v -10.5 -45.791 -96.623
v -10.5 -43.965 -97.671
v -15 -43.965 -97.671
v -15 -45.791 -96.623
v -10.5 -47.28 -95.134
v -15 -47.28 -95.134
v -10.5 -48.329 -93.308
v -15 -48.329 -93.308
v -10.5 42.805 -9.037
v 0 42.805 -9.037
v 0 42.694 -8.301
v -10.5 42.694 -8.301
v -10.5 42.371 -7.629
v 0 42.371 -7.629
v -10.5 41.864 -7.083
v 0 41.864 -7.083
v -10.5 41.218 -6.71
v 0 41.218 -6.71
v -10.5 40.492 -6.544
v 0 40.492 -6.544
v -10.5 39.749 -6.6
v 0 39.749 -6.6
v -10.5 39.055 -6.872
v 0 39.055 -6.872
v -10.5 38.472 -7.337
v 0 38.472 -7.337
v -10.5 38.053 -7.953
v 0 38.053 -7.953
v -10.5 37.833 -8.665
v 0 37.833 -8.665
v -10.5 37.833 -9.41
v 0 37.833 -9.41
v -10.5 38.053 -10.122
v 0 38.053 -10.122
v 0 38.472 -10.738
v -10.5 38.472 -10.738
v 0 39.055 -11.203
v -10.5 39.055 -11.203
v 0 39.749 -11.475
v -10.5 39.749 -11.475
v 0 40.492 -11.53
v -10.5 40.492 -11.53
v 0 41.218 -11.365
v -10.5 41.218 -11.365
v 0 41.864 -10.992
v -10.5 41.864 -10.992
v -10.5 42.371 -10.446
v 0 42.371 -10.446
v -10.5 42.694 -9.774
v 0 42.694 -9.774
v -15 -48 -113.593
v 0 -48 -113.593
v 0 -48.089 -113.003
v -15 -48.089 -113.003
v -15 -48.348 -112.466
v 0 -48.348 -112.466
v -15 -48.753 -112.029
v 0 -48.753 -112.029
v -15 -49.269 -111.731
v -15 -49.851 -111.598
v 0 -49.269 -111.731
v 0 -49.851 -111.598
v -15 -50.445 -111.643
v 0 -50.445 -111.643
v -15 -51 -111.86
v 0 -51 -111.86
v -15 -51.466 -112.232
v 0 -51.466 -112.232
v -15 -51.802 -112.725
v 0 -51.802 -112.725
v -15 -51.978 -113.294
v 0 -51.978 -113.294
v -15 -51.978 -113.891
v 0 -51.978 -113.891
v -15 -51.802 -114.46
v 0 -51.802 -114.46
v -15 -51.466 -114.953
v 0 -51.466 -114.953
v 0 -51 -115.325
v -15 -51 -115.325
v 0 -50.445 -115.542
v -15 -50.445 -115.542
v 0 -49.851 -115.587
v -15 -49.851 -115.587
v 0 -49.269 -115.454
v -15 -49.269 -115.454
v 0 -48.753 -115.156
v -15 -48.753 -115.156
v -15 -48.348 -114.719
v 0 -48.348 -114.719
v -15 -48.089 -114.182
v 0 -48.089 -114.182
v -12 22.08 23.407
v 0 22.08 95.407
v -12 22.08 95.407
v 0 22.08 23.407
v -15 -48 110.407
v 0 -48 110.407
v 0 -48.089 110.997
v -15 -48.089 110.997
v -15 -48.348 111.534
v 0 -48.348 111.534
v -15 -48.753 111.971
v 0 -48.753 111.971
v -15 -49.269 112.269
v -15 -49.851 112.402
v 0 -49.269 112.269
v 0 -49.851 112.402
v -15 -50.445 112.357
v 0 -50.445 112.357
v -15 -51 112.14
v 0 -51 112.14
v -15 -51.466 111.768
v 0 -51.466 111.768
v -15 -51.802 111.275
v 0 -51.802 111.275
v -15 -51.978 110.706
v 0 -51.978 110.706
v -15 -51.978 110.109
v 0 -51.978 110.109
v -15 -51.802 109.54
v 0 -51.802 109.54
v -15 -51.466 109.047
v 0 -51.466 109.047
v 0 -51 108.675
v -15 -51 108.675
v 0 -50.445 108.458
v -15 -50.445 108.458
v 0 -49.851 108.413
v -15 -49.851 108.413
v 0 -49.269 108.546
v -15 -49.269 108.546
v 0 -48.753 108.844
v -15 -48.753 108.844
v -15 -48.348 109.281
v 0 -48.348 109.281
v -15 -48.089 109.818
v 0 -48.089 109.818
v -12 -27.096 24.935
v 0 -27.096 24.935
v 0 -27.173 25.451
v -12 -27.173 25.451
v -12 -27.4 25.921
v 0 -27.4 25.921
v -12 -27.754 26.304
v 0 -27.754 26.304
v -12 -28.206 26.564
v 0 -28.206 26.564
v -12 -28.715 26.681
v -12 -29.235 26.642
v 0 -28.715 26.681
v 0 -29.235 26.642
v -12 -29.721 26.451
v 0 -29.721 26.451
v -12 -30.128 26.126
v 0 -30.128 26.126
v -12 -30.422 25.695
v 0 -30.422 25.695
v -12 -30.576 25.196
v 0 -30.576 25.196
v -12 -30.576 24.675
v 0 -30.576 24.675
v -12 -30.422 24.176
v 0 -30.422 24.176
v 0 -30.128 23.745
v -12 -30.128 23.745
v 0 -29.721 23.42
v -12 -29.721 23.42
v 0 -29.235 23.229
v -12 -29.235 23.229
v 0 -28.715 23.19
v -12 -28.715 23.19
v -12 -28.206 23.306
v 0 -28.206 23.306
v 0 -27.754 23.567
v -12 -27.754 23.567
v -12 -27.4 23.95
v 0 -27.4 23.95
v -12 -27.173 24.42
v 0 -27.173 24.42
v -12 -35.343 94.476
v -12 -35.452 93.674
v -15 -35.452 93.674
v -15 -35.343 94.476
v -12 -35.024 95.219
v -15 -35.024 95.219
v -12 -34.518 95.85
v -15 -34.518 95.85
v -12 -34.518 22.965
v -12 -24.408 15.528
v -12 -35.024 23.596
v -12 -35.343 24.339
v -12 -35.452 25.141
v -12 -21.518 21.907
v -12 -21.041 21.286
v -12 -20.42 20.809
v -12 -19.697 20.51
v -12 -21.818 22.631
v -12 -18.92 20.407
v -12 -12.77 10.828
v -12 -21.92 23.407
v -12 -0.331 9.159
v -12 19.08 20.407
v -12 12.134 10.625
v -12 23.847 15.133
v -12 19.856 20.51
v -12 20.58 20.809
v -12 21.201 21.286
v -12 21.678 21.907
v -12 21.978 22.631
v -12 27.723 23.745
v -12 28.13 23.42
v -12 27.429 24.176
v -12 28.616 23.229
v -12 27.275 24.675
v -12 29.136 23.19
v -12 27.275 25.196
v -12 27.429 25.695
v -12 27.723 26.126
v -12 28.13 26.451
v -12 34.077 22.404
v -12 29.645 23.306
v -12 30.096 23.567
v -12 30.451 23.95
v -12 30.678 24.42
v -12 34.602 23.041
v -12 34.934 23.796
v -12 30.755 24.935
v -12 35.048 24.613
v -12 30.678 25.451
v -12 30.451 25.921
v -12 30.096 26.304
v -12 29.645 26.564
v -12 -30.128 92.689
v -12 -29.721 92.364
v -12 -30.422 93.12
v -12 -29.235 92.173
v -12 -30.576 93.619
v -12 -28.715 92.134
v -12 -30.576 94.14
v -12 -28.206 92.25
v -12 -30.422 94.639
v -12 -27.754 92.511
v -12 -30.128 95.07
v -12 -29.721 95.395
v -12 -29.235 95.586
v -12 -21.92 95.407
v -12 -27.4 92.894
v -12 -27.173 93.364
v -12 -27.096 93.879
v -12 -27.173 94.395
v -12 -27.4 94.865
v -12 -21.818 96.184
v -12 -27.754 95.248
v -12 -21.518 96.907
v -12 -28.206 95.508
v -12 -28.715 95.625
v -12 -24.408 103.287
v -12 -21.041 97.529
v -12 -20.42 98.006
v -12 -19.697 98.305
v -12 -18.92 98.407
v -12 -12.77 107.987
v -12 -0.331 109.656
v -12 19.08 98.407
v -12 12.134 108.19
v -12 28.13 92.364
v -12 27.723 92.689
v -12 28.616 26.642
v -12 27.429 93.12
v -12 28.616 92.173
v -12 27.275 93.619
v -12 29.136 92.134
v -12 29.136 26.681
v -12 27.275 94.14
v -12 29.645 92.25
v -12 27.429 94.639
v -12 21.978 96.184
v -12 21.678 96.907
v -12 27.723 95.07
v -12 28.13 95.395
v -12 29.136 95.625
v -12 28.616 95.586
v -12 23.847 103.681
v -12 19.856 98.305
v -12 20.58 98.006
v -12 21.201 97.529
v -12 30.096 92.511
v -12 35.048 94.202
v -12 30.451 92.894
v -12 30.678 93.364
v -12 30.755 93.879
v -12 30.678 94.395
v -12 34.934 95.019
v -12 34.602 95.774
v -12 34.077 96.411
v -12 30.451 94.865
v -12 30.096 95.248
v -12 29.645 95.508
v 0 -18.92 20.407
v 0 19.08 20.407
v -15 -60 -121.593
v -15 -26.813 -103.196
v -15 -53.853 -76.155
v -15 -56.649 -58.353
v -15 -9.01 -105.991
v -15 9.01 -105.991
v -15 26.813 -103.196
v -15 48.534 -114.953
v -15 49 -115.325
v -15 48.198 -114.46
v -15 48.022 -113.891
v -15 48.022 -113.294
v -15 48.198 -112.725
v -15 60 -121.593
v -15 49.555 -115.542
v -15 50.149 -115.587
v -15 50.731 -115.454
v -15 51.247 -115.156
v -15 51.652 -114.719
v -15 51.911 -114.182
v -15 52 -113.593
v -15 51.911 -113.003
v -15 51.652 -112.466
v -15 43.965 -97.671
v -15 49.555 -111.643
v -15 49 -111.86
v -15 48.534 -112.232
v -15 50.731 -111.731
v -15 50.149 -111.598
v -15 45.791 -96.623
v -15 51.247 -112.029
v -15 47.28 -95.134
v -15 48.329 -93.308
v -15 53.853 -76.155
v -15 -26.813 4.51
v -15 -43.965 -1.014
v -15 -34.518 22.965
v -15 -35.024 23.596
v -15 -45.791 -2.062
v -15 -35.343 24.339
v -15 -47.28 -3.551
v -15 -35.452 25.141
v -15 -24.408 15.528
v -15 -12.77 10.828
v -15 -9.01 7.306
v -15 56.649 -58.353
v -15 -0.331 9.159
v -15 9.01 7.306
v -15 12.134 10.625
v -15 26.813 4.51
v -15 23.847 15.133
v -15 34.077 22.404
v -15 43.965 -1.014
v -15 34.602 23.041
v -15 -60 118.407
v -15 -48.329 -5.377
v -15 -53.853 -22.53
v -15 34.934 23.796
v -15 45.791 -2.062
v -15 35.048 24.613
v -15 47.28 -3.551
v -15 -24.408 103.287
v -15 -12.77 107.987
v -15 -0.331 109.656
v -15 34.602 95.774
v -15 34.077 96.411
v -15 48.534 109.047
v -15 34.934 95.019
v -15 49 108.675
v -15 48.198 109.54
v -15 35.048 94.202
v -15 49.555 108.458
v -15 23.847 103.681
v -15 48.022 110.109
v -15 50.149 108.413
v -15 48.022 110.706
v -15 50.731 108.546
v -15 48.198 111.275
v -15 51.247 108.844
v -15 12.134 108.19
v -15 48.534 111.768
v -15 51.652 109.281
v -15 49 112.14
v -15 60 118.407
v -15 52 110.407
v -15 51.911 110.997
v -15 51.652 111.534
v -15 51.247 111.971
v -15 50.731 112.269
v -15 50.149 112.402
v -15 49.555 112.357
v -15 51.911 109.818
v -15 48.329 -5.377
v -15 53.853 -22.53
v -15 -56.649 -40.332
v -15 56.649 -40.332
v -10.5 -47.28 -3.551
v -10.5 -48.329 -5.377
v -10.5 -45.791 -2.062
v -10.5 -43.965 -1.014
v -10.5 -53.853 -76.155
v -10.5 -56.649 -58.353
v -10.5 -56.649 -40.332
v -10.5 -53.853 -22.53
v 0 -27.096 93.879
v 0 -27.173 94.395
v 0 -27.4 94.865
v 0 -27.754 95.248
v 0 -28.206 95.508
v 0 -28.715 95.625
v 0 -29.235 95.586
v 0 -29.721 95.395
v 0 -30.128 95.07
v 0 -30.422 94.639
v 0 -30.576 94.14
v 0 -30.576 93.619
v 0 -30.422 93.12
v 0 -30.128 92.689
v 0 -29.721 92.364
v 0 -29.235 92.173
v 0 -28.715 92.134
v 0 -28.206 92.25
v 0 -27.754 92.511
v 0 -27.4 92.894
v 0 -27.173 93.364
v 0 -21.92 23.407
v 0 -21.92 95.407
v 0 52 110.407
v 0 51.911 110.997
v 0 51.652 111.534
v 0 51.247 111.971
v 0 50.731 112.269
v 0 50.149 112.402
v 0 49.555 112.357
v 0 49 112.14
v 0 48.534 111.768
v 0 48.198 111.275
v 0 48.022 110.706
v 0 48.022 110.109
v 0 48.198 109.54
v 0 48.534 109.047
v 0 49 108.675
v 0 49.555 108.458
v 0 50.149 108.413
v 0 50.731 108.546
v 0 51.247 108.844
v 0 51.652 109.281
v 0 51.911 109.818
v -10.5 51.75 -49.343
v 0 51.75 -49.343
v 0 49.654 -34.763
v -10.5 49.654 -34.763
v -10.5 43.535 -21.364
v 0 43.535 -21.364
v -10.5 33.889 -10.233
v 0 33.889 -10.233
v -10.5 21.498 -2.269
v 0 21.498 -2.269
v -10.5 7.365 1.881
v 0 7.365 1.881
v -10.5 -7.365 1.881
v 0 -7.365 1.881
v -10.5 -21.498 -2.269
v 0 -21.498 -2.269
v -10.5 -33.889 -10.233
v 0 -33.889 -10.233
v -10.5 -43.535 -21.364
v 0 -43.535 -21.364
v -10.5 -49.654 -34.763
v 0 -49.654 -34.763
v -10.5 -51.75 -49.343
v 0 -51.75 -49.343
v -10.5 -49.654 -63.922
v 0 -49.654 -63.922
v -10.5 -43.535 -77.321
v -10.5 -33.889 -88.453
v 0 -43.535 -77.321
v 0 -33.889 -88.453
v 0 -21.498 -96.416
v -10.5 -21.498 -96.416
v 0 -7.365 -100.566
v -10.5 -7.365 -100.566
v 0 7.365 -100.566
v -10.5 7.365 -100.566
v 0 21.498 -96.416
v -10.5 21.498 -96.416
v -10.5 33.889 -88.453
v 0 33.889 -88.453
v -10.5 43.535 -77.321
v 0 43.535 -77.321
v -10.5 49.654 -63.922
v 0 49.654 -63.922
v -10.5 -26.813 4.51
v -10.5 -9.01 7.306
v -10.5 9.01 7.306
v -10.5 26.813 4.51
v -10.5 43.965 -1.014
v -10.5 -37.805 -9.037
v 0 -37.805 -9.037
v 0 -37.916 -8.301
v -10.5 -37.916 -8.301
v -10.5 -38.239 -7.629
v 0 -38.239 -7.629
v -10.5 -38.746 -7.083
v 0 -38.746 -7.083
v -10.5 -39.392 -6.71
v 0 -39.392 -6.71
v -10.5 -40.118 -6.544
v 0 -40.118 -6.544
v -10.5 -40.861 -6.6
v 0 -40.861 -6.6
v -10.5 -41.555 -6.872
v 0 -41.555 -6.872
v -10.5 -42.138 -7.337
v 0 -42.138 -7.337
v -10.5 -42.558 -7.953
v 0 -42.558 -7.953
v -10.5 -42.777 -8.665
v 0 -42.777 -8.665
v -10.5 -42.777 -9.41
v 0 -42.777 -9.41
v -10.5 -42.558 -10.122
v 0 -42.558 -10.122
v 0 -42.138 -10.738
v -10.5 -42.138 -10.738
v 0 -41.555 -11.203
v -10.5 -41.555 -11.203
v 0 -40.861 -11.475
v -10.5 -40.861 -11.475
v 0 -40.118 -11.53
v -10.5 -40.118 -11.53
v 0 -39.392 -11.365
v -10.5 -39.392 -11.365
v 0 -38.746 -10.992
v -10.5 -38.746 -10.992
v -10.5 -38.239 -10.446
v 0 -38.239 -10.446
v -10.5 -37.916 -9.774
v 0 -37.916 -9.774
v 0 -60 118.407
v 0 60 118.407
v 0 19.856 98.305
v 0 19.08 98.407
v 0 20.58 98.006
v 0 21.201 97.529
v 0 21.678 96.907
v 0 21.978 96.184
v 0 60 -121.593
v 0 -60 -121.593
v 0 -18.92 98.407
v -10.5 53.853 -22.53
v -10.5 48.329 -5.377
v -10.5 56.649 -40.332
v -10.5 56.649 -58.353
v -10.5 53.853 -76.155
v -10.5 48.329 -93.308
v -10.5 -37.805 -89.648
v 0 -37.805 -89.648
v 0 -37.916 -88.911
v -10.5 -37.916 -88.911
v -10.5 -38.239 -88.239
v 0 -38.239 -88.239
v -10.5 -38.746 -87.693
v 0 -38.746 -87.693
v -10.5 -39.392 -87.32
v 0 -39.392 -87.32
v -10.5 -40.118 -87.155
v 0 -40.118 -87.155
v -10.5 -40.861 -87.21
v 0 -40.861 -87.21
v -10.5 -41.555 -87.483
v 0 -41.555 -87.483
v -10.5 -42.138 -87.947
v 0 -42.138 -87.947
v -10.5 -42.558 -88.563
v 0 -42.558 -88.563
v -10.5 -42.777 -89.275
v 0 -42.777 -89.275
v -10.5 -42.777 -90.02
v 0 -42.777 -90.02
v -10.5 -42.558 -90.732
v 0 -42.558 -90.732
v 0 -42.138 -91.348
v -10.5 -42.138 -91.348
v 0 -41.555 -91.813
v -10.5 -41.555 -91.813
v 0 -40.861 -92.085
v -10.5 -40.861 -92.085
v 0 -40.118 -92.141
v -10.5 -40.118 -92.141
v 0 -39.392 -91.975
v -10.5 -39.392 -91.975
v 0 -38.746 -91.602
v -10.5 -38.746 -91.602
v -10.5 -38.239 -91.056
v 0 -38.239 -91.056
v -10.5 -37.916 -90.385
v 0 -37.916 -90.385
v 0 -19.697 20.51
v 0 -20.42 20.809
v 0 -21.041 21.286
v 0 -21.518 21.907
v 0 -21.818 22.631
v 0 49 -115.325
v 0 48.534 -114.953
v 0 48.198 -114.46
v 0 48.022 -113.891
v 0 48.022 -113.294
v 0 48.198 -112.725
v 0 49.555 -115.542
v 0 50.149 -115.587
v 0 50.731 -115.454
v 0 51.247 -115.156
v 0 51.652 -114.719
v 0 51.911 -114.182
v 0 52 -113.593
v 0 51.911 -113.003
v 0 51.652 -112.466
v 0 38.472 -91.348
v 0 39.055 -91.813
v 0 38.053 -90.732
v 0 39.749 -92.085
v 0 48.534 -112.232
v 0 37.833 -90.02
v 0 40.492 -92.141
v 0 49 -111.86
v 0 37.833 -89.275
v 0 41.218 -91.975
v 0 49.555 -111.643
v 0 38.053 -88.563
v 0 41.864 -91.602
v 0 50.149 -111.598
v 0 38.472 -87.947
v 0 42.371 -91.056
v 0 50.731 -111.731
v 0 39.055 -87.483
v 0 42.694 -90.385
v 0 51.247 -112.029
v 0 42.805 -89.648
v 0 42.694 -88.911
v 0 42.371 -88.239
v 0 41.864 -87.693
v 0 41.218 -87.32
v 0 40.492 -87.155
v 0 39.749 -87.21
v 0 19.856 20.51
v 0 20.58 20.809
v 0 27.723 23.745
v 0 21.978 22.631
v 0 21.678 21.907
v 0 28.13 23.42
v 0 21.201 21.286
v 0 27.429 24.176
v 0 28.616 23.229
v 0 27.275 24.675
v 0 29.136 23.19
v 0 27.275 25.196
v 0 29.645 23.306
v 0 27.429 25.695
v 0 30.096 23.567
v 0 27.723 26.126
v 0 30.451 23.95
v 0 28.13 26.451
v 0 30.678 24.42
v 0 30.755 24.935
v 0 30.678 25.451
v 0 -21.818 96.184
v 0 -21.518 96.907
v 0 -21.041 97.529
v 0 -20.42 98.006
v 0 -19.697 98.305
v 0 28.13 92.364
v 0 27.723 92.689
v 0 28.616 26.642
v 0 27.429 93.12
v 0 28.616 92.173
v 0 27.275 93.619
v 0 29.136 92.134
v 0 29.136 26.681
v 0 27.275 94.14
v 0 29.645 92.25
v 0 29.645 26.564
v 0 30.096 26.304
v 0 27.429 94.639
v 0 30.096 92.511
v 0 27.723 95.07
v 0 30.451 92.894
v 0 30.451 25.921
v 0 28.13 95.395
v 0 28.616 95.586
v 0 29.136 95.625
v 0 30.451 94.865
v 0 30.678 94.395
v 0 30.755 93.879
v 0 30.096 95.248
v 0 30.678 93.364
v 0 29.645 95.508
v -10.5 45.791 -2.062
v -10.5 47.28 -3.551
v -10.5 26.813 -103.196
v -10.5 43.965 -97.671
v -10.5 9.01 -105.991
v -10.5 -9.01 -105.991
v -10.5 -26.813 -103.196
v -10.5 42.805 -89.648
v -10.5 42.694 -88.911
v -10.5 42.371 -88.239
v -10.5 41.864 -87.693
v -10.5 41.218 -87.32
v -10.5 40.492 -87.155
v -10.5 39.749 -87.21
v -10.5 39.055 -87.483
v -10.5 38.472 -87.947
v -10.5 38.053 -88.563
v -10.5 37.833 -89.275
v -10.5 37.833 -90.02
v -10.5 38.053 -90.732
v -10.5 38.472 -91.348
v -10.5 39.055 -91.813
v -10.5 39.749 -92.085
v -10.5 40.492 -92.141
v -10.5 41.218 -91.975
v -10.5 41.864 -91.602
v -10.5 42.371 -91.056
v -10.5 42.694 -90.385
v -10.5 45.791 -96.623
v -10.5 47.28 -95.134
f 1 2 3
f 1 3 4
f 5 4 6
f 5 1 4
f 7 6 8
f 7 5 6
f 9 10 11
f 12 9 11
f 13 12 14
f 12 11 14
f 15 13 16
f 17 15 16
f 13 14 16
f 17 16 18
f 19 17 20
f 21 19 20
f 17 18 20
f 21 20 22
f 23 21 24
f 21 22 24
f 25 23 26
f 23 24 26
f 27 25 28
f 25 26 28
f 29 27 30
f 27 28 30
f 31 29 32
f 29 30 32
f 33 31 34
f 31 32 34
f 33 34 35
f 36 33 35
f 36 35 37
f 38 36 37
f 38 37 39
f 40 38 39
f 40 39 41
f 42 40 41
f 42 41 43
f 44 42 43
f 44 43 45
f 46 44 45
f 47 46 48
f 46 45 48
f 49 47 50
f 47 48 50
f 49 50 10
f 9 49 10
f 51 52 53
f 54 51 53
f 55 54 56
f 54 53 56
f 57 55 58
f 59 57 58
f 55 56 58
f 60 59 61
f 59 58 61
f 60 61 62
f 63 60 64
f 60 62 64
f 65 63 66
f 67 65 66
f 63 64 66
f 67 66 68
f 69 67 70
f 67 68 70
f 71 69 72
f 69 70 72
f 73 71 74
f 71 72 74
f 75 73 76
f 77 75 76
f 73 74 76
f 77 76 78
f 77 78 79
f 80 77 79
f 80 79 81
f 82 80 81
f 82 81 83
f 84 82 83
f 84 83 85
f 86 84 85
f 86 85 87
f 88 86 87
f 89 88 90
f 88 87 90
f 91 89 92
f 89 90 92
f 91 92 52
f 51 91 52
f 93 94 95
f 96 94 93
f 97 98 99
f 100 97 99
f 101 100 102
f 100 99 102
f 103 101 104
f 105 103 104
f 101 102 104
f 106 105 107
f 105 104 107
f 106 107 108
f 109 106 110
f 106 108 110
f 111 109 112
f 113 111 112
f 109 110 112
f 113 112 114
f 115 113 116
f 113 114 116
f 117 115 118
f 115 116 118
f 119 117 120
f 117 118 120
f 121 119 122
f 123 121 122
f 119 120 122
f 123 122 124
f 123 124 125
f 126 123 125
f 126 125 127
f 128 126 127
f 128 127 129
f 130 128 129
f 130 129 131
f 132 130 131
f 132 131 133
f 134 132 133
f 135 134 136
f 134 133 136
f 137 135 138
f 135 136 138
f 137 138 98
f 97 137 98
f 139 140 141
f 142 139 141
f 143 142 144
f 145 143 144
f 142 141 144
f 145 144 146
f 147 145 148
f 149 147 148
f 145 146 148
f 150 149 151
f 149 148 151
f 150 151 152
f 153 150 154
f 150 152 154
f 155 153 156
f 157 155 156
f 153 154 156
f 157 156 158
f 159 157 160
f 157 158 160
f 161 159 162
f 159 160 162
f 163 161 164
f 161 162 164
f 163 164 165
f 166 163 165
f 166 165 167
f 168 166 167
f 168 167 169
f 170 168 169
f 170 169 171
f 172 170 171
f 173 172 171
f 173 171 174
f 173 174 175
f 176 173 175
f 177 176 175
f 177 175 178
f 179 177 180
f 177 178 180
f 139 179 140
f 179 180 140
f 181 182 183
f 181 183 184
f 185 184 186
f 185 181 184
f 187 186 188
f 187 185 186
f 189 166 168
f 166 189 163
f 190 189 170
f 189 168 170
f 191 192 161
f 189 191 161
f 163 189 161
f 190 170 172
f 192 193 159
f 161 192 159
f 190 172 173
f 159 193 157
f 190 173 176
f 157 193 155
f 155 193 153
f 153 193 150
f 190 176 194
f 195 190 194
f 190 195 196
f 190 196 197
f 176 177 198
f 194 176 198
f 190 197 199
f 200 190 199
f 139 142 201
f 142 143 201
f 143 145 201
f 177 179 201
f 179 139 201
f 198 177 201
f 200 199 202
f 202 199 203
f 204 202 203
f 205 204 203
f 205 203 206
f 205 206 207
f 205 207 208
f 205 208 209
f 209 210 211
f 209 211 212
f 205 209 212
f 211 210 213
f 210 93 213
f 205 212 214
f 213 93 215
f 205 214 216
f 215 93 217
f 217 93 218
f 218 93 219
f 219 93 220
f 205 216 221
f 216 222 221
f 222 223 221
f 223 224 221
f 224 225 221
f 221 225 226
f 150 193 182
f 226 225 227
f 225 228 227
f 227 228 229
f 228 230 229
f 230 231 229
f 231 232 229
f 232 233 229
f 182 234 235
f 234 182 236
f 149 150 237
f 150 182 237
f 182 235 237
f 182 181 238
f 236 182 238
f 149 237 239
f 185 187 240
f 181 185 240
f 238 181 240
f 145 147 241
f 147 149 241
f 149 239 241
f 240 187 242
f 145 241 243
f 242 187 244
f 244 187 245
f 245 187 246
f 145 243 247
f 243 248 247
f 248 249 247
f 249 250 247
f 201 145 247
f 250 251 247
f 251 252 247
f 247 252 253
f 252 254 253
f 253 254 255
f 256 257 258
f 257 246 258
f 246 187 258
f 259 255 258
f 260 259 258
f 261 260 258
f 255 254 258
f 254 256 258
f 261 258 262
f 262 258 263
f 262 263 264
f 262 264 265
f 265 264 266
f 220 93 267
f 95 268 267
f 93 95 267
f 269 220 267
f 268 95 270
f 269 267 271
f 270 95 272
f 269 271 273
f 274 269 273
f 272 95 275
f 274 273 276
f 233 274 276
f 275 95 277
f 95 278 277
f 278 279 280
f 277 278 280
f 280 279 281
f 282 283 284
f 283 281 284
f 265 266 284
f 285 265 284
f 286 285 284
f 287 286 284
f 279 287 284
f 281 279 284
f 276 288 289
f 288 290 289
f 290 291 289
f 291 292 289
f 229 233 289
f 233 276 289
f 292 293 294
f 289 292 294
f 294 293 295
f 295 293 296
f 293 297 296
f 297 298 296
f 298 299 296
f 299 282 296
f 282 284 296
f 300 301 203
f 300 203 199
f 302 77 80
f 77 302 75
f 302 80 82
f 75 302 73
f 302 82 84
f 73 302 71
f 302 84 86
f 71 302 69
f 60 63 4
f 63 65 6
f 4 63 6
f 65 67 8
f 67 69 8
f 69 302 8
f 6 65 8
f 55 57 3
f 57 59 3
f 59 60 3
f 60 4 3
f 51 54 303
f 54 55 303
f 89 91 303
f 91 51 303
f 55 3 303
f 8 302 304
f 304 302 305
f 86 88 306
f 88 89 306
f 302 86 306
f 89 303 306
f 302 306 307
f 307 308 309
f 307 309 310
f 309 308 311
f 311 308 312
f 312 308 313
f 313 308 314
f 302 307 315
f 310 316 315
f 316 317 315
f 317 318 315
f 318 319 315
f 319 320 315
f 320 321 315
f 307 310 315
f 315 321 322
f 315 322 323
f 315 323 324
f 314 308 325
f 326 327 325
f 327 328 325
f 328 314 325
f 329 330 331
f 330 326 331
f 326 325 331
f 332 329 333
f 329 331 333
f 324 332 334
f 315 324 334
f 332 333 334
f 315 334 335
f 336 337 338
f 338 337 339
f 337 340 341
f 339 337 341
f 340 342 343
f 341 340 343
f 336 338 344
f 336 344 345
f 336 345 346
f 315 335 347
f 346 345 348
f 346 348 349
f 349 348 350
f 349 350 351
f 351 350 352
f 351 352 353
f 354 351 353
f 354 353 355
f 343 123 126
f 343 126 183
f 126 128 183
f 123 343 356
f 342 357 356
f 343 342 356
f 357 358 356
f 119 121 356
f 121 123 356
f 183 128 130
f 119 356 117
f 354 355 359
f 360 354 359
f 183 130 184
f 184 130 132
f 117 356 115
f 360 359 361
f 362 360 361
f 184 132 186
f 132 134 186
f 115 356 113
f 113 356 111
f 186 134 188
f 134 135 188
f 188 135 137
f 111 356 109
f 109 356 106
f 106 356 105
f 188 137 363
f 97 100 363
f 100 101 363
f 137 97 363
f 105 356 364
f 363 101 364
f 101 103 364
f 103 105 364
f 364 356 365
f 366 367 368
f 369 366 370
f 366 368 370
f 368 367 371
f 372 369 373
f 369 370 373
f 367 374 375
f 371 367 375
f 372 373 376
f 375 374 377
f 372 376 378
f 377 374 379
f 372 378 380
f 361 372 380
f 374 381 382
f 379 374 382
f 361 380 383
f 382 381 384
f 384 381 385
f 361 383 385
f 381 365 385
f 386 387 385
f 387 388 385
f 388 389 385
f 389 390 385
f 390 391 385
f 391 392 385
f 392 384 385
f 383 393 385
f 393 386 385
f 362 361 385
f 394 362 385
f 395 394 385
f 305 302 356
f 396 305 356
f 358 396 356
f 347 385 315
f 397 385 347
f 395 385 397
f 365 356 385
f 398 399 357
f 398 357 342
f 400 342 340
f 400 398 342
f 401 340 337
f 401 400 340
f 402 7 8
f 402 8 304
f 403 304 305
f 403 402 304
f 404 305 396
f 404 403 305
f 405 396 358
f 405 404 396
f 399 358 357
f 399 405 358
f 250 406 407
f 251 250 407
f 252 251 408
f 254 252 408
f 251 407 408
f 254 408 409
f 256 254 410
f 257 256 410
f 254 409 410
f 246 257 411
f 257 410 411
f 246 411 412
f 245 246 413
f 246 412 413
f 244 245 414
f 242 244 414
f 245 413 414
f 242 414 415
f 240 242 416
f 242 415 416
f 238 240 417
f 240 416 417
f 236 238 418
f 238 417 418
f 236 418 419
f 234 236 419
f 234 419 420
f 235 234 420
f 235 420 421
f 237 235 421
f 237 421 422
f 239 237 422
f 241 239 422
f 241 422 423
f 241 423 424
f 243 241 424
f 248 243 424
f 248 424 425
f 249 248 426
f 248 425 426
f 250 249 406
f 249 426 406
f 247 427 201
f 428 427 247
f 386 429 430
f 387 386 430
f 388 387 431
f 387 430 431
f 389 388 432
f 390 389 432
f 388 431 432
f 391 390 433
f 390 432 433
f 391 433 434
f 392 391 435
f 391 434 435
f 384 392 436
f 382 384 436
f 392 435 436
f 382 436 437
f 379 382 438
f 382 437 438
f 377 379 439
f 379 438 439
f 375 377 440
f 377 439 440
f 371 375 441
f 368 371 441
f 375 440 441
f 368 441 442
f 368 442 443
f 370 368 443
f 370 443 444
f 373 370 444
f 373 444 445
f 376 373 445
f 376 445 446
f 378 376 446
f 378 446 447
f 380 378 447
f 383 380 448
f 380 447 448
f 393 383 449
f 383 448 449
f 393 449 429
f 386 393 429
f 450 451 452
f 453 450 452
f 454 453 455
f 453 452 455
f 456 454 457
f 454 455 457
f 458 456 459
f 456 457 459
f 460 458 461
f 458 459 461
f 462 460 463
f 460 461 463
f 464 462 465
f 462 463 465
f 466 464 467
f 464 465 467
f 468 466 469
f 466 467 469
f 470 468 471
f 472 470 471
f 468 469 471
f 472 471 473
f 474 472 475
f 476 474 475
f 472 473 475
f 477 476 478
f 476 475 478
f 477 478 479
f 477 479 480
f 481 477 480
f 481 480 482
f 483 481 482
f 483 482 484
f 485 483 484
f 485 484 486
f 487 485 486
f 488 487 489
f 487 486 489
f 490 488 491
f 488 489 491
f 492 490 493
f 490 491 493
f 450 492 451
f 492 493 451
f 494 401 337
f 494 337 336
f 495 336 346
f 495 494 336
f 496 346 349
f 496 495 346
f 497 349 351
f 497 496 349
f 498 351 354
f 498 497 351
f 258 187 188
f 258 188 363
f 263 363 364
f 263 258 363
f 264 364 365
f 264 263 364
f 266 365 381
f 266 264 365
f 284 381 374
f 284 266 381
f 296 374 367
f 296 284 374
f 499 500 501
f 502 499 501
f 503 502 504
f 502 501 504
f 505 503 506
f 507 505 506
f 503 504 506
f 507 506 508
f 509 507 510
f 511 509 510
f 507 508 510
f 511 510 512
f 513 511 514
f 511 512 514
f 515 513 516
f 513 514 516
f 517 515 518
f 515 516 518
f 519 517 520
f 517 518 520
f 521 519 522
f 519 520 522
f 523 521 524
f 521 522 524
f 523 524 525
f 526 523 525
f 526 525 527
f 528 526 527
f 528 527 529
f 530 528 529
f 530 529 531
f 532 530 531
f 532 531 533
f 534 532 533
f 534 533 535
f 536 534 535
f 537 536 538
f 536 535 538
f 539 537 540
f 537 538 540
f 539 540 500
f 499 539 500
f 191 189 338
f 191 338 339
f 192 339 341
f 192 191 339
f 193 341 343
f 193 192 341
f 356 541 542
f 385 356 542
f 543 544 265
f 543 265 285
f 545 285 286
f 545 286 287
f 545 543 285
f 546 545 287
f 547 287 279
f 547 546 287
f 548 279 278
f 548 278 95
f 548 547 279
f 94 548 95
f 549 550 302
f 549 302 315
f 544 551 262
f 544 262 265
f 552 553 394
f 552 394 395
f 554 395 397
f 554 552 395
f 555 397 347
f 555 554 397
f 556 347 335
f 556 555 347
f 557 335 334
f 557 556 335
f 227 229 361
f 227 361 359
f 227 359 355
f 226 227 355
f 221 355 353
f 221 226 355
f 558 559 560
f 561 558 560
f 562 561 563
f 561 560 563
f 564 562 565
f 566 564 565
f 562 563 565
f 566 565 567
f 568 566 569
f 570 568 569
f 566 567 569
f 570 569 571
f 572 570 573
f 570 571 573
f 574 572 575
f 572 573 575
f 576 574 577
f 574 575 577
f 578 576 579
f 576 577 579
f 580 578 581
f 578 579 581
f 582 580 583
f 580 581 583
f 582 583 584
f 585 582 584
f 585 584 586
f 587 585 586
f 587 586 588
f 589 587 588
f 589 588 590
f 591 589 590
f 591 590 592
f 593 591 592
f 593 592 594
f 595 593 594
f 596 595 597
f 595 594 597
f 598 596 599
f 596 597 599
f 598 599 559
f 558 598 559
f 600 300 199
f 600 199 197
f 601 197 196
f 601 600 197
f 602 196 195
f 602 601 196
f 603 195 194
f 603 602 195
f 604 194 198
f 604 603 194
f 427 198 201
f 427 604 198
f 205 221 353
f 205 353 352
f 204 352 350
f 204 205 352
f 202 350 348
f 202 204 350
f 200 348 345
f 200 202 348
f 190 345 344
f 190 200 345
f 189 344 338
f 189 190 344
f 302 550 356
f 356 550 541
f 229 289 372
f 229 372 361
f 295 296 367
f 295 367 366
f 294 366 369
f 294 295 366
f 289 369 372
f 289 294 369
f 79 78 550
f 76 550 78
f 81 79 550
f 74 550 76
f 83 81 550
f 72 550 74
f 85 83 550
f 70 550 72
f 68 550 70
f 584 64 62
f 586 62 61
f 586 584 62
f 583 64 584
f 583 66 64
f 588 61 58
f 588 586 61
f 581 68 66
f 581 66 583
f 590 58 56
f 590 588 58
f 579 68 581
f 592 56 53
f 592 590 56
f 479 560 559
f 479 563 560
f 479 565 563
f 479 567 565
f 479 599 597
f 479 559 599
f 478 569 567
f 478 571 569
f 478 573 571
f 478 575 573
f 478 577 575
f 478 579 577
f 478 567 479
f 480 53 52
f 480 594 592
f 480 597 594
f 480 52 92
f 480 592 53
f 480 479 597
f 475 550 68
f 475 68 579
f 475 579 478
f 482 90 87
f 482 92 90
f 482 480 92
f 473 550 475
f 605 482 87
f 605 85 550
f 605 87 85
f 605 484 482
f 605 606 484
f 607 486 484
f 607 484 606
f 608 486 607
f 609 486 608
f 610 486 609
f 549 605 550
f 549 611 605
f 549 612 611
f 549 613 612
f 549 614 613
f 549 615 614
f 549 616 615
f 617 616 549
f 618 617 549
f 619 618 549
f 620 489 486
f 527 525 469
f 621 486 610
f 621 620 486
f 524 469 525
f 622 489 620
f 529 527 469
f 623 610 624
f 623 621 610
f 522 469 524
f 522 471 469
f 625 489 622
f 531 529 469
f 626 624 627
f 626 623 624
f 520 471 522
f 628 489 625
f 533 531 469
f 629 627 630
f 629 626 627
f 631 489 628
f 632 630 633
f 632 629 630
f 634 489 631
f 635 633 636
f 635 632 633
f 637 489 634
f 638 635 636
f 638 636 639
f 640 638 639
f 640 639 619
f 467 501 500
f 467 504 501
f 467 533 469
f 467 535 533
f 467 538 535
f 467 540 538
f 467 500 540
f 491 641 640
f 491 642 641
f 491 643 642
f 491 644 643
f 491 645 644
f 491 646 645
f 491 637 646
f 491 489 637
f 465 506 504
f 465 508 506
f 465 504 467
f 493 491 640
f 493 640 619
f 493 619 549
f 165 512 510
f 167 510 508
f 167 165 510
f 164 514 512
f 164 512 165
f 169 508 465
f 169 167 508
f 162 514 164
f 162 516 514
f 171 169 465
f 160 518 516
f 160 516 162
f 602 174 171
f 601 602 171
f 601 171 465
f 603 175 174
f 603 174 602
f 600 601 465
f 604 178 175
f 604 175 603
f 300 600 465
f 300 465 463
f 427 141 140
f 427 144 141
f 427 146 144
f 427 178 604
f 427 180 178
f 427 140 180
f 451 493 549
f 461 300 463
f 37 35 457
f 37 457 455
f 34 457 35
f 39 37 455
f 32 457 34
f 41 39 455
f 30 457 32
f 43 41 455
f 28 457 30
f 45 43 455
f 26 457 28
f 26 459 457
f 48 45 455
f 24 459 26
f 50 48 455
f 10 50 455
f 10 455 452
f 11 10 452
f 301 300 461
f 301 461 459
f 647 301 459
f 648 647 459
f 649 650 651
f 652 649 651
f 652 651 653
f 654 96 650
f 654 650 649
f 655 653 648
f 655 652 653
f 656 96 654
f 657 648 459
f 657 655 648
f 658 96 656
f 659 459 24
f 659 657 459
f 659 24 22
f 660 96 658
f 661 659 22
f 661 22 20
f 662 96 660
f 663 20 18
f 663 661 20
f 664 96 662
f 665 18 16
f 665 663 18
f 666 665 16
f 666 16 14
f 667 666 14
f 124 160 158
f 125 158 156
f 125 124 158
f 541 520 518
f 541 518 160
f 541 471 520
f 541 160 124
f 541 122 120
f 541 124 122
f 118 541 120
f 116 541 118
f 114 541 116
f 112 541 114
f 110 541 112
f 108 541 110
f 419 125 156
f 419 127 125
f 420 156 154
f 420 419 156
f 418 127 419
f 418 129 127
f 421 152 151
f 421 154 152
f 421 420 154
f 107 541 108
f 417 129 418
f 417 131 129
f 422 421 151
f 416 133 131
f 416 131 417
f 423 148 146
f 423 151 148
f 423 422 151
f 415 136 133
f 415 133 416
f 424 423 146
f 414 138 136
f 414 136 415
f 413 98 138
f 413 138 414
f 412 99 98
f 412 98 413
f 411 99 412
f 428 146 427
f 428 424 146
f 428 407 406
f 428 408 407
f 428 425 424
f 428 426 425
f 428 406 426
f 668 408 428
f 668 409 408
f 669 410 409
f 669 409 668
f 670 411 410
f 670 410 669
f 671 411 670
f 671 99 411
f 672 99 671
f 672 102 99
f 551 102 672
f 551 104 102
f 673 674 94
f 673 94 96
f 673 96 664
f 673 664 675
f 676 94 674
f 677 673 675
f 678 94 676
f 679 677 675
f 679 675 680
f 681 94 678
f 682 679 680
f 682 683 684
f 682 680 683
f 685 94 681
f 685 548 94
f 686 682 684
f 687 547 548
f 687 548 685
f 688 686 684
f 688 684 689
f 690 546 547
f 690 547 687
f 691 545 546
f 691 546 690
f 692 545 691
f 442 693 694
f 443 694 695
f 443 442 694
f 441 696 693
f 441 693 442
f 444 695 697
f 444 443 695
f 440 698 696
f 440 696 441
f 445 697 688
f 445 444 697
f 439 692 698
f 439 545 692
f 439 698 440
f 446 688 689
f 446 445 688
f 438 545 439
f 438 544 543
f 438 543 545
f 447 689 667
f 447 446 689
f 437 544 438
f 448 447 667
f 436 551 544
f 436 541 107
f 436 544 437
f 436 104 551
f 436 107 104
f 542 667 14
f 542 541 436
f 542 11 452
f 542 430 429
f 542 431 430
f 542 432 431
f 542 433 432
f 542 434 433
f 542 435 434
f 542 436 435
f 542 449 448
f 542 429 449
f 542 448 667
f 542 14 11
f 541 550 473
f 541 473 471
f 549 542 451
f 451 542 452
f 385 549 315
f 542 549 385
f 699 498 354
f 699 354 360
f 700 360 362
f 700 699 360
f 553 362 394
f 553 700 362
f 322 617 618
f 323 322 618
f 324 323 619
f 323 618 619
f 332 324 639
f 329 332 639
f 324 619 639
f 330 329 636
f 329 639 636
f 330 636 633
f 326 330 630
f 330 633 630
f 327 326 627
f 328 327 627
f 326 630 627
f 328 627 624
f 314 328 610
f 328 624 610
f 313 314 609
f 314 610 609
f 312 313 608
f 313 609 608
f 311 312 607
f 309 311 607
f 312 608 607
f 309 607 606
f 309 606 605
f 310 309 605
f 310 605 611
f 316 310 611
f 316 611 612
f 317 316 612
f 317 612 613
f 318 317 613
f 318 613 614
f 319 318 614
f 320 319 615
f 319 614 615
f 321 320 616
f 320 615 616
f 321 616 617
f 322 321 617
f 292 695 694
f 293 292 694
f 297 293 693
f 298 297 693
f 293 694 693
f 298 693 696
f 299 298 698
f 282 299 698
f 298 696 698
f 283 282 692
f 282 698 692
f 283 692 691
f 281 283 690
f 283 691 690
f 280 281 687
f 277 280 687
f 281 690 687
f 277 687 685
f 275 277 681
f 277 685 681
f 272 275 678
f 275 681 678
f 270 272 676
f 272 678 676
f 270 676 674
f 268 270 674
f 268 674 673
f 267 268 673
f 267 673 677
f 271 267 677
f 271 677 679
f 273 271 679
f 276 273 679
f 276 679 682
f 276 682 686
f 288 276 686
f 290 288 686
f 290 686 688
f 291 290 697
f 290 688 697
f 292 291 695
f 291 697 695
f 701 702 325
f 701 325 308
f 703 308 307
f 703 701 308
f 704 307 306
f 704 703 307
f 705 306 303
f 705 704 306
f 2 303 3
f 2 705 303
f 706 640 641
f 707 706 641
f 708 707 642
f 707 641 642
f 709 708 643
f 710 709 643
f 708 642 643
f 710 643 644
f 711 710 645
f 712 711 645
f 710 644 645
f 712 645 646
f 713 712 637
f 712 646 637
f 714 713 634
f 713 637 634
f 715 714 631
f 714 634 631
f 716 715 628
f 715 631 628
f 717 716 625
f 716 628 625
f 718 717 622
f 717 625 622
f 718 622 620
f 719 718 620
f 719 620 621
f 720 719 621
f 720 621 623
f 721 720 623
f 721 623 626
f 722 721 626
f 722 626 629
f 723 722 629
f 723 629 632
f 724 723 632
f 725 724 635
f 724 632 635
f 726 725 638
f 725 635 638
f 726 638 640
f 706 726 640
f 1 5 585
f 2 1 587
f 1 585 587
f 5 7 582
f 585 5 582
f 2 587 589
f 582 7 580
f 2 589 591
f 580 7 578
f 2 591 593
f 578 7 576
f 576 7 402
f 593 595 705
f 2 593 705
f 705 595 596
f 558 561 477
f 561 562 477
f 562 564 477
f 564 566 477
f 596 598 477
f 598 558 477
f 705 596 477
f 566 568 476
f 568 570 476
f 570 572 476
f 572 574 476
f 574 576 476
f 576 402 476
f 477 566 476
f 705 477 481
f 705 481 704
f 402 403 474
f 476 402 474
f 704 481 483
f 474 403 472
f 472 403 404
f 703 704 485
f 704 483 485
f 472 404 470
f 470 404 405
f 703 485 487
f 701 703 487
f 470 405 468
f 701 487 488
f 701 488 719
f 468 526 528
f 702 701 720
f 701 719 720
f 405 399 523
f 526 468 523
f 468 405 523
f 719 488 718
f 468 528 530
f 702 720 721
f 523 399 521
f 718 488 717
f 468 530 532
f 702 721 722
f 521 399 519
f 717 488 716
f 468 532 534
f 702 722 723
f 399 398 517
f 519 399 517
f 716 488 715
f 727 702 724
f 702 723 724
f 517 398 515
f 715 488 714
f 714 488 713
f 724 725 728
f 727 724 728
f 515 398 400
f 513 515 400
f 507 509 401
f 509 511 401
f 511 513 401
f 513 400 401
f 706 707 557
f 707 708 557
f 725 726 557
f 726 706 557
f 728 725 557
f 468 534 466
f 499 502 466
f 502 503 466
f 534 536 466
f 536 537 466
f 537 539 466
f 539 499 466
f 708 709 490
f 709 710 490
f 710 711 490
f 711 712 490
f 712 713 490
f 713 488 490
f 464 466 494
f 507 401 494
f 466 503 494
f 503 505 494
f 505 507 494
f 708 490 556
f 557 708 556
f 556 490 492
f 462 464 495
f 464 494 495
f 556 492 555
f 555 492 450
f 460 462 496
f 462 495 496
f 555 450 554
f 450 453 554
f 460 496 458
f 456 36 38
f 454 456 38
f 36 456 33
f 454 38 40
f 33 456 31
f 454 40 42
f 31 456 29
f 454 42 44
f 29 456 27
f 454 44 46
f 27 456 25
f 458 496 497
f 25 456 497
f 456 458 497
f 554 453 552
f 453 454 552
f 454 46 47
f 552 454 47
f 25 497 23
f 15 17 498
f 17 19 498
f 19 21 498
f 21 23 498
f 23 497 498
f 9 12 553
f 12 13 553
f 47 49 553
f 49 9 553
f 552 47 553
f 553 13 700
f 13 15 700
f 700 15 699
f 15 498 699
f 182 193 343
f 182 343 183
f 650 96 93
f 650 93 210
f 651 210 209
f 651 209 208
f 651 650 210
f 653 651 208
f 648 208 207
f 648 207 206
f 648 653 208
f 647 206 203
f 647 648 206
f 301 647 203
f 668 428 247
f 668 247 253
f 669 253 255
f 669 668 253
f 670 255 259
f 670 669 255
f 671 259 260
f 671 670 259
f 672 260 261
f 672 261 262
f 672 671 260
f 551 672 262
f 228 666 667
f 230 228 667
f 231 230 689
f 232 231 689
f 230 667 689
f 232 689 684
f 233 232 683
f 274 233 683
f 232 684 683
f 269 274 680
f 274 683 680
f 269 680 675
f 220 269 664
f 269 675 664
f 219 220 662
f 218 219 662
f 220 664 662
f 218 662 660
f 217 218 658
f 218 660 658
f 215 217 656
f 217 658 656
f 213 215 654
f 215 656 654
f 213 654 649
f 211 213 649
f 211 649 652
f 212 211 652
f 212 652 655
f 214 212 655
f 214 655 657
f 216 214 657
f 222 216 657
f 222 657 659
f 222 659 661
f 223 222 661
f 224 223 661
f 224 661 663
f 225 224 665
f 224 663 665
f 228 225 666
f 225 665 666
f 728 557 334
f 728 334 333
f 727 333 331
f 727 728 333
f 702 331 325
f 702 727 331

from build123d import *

# Parameters (mm, degrees)
F0_W     = 120
F0_H     = 240
F0_R     = 2
F0_R_2   = 1.75
F1_DEPTH = 15
F2_DEPTH = 12
F0_R_3   = 2.5
F0_R_4   = 51.75
F3_DEPTH = 10.5


with BuildPart() as f1:
    # F0 (on Right) → F1 (new body)
    with BuildSketch(Plane.YZ):
        with Locations((0, -1.592548)):
            Rectangle(F0_W, F0_H)
        with Locations((-49.999997, -113.592548)):
            Circle(F0_R, mode=Mode.SUBTRACT)
        with BuildLine():
            ThreePointArc((-43.965421, -1.013646), (0, 7.657452), (43.965421, -1.013646))
            ThreePointArc((43.965421, -1.013646), (46.58482, -2.757728), (48.328902, -5.377127))
            ThreePointArc((48.328902, -5.377127), (57, -49.342548), (48.328902, -93.307969))
            ThreePointArc((48.328902, -93.307969), (46.58482, -95.927368), (43.965421, -97.67145))
            ThreePointArc((43.965421, -97.67145), (0, -106.342548), (-43.965421, -97.67145))
            ThreePointArc((-43.965421, -97.67145), (-46.58482, -95.927368), (-48.328902, -93.307969))
            ThreePointArc((-48.328902, -93.307969), (-57, -49.342548), (-48.328902, -5.377127))
            ThreePointArc((-48.328902, -5.377127), (-46.58482, -2.757728), (-43.965421, -1.013646))
        make_face(mode=Mode.SUBTRACT)
        with Locations((50.000003, -113.592548)):
            Circle(F0_R, mode=Mode.SUBTRACT)
        with Locations((-45.415495, 59.40745)):
            Circle(F0_R_2, mode=Mode.SUBTRACT)
        with Locations((-49.999997, 110.407452)):
            Circle(F0_R, mode=Mode.SUBTRACT)
        with BuildLine():
            ThreePointArc((-34.517993, 95.849841), (-0.330971, 109.655772), (34.077245, 96.410744))
            ThreePointArc((34.077245, 96.410744), (34.794286, 95.408017), (35.047553, 94.201592))
            Line((35.047553, 94.201592), (35.047553, 24.613312))
            ThreePointArc((35.047553, 24.613312), (34.794286, 23.406887), (34.077245, 22.40416))
            ThreePointArc((34.077245, 22.40416), (-0.330971, 9.159132), (-34.517993, 22.965063))
            ThreePointArc((-34.517993, 22.965063), (-35.208951, 23.956802), (-35.452447, 25.140728))
            Line((-35.452447, 25.140728), (-35.452447, 93.674176))
            ThreePointArc((-35.452447, 93.674176), (-35.208951, 94.858102), (-34.517993, 95.849841))
        make_face(mode=Mode.SUBTRACT)
        with Locations((45.292415, 59.40745)):
            Circle(F0_R_2, mode=Mode.SUBTRACT)
        with Locations((50.000003, 110.407455)):
            Circle(F0_R, mode=Mode.SUBTRACT)
        with Locations((45.292415, 59.40745)):
            Circle(F0_R_2)
        with Locations((-45.415495, 59.40745)):
            Circle(F0_R_2)
    extrude(amount=-F1_DEPTH)

    # F0 (on Right) → F2 (join)
    with BuildSketch(Plane.YZ):
        with BuildLine():
            ThreePointArc((35.047553, 94.201592), (34.794286, 95.408017), (34.077245, 96.410744))
            ThreePointArc((34.077245, 96.410744), (-0.330971, 109.655772), (-34.517993, 95.849841))
            ThreePointArc((-34.517993, 95.849841), (-35.208951, 94.858102), (-35.452447, 93.674176))
            Line((-35.452447, 93.674176), (-35.452447, 25.140728))
            ThreePointArc((-35.452447, 25.140728), (-35.208951, 23.956802), (-34.517993, 22.965063))
            ThreePointArc((-34.517993, 22.965063), (-0.330971, 9.159132), (34.077245, 22.40416))
            ThreePointArc((34.077245, 22.40416), (34.794286, 23.406887), (35.047553, 24.613312))
            Line((35.047553, 24.613312), (35.047553, 94.201592))
        make_face()
        with Locations((-28.845534, 24.935452)):
            Circle(F0_R_2, mode=Mode.SUBTRACT)
        with Locations((-28.845534, 93.879452)):
            Circle(F0_R_2, mode=Mode.SUBTRACT)
        with Locations((29.005351, 24.935452)):
            Circle(F0_R_2, mode=Mode.SUBTRACT)
        with BuildLine():
            Line((-18.920092, 98.407452), (19.079908, 98.407452))
            ThreePointArc((19.079908, 98.407452), (21.201229, 97.528772), (22.079908, 95.407452))
            Line((22.079908, 95.407452), (22.079908, 23.407452))
            ThreePointArc((22.079908, 23.407452), (21.201229, 21.286132), (19.079908, 20.407452))
            Line((19.079908, 20.407452), (-18.920092, 20.407452))
            ThreePointArc((-18.920092, 20.407452), (-21.041412, 21.286132), (-21.920092, 23.407452))
            Line((-21.920092, 23.407452), (-21.920092, 95.407452))
            ThreePointArc((-21.920092, 95.407452), (-21.041412, 97.528772), (-18.920092, 98.407452))
        make_face(mode=Mode.SUBTRACT)
        with Locations((29.005351, 93.879452)):
            Circle(F0_R_2, mode=Mode.SUBTRACT)
    extrude(amount=-F2_DEPTH)

    # F0 (on Right) → F3 (join)
    with BuildSketch(Plane.YZ):
        with BuildLine():
            ThreePointArc((48.328902, -5.377127), (46.58482, -2.757728), (43.965421, -1.013646))
            ThreePointArc((43.965421, -1.013646), (0, 7.657452), (-43.965421, -1.013646))
            ThreePointArc((-43.965421, -1.013646), (-46.58482, -2.757728), (-48.328902, -5.377127))
            ThreePointArc((-48.328902, -5.377127), (-57, -49.342548), (-48.328902, -93.307969))
            ThreePointArc((-48.328902, -93.307969), (-46.58482, -95.927368), (-43.965421, -97.67145))
            ThreePointArc((-43.965421, -97.67145), (0, -106.342548), (43.965421, -97.67145))
            ThreePointArc((43.965421, -97.67145), (46.58482, -95.927368), (48.328902, -93.307969))
            ThreePointArc((48.328902, -93.307969), (57, -49.342548), (48.328902, -5.377127))
        make_face()
        with Locations((-40.305087, -89.647635)):
            Circle(F0_R_3, mode=Mode.SUBTRACT)
        with Locations((-40.305087, -9.037462)):
            Circle(F0_R_3, mode=Mode.SUBTRACT)
        with Locations((40.305087, -89.647635)):
            Circle(F0_R_3, mode=Mode.SUBTRACT)
        with Locations((0, -49.342548)):
            Circle(F0_R_4, mode=Mode.SUBTRACT)
        with Locations((40.305087, -9.037462)):
            Circle(F0_R_3, mode=Mode.SUBTRACT)
    extrude(amount=-F3_DEPTH)


solid = f1.part
